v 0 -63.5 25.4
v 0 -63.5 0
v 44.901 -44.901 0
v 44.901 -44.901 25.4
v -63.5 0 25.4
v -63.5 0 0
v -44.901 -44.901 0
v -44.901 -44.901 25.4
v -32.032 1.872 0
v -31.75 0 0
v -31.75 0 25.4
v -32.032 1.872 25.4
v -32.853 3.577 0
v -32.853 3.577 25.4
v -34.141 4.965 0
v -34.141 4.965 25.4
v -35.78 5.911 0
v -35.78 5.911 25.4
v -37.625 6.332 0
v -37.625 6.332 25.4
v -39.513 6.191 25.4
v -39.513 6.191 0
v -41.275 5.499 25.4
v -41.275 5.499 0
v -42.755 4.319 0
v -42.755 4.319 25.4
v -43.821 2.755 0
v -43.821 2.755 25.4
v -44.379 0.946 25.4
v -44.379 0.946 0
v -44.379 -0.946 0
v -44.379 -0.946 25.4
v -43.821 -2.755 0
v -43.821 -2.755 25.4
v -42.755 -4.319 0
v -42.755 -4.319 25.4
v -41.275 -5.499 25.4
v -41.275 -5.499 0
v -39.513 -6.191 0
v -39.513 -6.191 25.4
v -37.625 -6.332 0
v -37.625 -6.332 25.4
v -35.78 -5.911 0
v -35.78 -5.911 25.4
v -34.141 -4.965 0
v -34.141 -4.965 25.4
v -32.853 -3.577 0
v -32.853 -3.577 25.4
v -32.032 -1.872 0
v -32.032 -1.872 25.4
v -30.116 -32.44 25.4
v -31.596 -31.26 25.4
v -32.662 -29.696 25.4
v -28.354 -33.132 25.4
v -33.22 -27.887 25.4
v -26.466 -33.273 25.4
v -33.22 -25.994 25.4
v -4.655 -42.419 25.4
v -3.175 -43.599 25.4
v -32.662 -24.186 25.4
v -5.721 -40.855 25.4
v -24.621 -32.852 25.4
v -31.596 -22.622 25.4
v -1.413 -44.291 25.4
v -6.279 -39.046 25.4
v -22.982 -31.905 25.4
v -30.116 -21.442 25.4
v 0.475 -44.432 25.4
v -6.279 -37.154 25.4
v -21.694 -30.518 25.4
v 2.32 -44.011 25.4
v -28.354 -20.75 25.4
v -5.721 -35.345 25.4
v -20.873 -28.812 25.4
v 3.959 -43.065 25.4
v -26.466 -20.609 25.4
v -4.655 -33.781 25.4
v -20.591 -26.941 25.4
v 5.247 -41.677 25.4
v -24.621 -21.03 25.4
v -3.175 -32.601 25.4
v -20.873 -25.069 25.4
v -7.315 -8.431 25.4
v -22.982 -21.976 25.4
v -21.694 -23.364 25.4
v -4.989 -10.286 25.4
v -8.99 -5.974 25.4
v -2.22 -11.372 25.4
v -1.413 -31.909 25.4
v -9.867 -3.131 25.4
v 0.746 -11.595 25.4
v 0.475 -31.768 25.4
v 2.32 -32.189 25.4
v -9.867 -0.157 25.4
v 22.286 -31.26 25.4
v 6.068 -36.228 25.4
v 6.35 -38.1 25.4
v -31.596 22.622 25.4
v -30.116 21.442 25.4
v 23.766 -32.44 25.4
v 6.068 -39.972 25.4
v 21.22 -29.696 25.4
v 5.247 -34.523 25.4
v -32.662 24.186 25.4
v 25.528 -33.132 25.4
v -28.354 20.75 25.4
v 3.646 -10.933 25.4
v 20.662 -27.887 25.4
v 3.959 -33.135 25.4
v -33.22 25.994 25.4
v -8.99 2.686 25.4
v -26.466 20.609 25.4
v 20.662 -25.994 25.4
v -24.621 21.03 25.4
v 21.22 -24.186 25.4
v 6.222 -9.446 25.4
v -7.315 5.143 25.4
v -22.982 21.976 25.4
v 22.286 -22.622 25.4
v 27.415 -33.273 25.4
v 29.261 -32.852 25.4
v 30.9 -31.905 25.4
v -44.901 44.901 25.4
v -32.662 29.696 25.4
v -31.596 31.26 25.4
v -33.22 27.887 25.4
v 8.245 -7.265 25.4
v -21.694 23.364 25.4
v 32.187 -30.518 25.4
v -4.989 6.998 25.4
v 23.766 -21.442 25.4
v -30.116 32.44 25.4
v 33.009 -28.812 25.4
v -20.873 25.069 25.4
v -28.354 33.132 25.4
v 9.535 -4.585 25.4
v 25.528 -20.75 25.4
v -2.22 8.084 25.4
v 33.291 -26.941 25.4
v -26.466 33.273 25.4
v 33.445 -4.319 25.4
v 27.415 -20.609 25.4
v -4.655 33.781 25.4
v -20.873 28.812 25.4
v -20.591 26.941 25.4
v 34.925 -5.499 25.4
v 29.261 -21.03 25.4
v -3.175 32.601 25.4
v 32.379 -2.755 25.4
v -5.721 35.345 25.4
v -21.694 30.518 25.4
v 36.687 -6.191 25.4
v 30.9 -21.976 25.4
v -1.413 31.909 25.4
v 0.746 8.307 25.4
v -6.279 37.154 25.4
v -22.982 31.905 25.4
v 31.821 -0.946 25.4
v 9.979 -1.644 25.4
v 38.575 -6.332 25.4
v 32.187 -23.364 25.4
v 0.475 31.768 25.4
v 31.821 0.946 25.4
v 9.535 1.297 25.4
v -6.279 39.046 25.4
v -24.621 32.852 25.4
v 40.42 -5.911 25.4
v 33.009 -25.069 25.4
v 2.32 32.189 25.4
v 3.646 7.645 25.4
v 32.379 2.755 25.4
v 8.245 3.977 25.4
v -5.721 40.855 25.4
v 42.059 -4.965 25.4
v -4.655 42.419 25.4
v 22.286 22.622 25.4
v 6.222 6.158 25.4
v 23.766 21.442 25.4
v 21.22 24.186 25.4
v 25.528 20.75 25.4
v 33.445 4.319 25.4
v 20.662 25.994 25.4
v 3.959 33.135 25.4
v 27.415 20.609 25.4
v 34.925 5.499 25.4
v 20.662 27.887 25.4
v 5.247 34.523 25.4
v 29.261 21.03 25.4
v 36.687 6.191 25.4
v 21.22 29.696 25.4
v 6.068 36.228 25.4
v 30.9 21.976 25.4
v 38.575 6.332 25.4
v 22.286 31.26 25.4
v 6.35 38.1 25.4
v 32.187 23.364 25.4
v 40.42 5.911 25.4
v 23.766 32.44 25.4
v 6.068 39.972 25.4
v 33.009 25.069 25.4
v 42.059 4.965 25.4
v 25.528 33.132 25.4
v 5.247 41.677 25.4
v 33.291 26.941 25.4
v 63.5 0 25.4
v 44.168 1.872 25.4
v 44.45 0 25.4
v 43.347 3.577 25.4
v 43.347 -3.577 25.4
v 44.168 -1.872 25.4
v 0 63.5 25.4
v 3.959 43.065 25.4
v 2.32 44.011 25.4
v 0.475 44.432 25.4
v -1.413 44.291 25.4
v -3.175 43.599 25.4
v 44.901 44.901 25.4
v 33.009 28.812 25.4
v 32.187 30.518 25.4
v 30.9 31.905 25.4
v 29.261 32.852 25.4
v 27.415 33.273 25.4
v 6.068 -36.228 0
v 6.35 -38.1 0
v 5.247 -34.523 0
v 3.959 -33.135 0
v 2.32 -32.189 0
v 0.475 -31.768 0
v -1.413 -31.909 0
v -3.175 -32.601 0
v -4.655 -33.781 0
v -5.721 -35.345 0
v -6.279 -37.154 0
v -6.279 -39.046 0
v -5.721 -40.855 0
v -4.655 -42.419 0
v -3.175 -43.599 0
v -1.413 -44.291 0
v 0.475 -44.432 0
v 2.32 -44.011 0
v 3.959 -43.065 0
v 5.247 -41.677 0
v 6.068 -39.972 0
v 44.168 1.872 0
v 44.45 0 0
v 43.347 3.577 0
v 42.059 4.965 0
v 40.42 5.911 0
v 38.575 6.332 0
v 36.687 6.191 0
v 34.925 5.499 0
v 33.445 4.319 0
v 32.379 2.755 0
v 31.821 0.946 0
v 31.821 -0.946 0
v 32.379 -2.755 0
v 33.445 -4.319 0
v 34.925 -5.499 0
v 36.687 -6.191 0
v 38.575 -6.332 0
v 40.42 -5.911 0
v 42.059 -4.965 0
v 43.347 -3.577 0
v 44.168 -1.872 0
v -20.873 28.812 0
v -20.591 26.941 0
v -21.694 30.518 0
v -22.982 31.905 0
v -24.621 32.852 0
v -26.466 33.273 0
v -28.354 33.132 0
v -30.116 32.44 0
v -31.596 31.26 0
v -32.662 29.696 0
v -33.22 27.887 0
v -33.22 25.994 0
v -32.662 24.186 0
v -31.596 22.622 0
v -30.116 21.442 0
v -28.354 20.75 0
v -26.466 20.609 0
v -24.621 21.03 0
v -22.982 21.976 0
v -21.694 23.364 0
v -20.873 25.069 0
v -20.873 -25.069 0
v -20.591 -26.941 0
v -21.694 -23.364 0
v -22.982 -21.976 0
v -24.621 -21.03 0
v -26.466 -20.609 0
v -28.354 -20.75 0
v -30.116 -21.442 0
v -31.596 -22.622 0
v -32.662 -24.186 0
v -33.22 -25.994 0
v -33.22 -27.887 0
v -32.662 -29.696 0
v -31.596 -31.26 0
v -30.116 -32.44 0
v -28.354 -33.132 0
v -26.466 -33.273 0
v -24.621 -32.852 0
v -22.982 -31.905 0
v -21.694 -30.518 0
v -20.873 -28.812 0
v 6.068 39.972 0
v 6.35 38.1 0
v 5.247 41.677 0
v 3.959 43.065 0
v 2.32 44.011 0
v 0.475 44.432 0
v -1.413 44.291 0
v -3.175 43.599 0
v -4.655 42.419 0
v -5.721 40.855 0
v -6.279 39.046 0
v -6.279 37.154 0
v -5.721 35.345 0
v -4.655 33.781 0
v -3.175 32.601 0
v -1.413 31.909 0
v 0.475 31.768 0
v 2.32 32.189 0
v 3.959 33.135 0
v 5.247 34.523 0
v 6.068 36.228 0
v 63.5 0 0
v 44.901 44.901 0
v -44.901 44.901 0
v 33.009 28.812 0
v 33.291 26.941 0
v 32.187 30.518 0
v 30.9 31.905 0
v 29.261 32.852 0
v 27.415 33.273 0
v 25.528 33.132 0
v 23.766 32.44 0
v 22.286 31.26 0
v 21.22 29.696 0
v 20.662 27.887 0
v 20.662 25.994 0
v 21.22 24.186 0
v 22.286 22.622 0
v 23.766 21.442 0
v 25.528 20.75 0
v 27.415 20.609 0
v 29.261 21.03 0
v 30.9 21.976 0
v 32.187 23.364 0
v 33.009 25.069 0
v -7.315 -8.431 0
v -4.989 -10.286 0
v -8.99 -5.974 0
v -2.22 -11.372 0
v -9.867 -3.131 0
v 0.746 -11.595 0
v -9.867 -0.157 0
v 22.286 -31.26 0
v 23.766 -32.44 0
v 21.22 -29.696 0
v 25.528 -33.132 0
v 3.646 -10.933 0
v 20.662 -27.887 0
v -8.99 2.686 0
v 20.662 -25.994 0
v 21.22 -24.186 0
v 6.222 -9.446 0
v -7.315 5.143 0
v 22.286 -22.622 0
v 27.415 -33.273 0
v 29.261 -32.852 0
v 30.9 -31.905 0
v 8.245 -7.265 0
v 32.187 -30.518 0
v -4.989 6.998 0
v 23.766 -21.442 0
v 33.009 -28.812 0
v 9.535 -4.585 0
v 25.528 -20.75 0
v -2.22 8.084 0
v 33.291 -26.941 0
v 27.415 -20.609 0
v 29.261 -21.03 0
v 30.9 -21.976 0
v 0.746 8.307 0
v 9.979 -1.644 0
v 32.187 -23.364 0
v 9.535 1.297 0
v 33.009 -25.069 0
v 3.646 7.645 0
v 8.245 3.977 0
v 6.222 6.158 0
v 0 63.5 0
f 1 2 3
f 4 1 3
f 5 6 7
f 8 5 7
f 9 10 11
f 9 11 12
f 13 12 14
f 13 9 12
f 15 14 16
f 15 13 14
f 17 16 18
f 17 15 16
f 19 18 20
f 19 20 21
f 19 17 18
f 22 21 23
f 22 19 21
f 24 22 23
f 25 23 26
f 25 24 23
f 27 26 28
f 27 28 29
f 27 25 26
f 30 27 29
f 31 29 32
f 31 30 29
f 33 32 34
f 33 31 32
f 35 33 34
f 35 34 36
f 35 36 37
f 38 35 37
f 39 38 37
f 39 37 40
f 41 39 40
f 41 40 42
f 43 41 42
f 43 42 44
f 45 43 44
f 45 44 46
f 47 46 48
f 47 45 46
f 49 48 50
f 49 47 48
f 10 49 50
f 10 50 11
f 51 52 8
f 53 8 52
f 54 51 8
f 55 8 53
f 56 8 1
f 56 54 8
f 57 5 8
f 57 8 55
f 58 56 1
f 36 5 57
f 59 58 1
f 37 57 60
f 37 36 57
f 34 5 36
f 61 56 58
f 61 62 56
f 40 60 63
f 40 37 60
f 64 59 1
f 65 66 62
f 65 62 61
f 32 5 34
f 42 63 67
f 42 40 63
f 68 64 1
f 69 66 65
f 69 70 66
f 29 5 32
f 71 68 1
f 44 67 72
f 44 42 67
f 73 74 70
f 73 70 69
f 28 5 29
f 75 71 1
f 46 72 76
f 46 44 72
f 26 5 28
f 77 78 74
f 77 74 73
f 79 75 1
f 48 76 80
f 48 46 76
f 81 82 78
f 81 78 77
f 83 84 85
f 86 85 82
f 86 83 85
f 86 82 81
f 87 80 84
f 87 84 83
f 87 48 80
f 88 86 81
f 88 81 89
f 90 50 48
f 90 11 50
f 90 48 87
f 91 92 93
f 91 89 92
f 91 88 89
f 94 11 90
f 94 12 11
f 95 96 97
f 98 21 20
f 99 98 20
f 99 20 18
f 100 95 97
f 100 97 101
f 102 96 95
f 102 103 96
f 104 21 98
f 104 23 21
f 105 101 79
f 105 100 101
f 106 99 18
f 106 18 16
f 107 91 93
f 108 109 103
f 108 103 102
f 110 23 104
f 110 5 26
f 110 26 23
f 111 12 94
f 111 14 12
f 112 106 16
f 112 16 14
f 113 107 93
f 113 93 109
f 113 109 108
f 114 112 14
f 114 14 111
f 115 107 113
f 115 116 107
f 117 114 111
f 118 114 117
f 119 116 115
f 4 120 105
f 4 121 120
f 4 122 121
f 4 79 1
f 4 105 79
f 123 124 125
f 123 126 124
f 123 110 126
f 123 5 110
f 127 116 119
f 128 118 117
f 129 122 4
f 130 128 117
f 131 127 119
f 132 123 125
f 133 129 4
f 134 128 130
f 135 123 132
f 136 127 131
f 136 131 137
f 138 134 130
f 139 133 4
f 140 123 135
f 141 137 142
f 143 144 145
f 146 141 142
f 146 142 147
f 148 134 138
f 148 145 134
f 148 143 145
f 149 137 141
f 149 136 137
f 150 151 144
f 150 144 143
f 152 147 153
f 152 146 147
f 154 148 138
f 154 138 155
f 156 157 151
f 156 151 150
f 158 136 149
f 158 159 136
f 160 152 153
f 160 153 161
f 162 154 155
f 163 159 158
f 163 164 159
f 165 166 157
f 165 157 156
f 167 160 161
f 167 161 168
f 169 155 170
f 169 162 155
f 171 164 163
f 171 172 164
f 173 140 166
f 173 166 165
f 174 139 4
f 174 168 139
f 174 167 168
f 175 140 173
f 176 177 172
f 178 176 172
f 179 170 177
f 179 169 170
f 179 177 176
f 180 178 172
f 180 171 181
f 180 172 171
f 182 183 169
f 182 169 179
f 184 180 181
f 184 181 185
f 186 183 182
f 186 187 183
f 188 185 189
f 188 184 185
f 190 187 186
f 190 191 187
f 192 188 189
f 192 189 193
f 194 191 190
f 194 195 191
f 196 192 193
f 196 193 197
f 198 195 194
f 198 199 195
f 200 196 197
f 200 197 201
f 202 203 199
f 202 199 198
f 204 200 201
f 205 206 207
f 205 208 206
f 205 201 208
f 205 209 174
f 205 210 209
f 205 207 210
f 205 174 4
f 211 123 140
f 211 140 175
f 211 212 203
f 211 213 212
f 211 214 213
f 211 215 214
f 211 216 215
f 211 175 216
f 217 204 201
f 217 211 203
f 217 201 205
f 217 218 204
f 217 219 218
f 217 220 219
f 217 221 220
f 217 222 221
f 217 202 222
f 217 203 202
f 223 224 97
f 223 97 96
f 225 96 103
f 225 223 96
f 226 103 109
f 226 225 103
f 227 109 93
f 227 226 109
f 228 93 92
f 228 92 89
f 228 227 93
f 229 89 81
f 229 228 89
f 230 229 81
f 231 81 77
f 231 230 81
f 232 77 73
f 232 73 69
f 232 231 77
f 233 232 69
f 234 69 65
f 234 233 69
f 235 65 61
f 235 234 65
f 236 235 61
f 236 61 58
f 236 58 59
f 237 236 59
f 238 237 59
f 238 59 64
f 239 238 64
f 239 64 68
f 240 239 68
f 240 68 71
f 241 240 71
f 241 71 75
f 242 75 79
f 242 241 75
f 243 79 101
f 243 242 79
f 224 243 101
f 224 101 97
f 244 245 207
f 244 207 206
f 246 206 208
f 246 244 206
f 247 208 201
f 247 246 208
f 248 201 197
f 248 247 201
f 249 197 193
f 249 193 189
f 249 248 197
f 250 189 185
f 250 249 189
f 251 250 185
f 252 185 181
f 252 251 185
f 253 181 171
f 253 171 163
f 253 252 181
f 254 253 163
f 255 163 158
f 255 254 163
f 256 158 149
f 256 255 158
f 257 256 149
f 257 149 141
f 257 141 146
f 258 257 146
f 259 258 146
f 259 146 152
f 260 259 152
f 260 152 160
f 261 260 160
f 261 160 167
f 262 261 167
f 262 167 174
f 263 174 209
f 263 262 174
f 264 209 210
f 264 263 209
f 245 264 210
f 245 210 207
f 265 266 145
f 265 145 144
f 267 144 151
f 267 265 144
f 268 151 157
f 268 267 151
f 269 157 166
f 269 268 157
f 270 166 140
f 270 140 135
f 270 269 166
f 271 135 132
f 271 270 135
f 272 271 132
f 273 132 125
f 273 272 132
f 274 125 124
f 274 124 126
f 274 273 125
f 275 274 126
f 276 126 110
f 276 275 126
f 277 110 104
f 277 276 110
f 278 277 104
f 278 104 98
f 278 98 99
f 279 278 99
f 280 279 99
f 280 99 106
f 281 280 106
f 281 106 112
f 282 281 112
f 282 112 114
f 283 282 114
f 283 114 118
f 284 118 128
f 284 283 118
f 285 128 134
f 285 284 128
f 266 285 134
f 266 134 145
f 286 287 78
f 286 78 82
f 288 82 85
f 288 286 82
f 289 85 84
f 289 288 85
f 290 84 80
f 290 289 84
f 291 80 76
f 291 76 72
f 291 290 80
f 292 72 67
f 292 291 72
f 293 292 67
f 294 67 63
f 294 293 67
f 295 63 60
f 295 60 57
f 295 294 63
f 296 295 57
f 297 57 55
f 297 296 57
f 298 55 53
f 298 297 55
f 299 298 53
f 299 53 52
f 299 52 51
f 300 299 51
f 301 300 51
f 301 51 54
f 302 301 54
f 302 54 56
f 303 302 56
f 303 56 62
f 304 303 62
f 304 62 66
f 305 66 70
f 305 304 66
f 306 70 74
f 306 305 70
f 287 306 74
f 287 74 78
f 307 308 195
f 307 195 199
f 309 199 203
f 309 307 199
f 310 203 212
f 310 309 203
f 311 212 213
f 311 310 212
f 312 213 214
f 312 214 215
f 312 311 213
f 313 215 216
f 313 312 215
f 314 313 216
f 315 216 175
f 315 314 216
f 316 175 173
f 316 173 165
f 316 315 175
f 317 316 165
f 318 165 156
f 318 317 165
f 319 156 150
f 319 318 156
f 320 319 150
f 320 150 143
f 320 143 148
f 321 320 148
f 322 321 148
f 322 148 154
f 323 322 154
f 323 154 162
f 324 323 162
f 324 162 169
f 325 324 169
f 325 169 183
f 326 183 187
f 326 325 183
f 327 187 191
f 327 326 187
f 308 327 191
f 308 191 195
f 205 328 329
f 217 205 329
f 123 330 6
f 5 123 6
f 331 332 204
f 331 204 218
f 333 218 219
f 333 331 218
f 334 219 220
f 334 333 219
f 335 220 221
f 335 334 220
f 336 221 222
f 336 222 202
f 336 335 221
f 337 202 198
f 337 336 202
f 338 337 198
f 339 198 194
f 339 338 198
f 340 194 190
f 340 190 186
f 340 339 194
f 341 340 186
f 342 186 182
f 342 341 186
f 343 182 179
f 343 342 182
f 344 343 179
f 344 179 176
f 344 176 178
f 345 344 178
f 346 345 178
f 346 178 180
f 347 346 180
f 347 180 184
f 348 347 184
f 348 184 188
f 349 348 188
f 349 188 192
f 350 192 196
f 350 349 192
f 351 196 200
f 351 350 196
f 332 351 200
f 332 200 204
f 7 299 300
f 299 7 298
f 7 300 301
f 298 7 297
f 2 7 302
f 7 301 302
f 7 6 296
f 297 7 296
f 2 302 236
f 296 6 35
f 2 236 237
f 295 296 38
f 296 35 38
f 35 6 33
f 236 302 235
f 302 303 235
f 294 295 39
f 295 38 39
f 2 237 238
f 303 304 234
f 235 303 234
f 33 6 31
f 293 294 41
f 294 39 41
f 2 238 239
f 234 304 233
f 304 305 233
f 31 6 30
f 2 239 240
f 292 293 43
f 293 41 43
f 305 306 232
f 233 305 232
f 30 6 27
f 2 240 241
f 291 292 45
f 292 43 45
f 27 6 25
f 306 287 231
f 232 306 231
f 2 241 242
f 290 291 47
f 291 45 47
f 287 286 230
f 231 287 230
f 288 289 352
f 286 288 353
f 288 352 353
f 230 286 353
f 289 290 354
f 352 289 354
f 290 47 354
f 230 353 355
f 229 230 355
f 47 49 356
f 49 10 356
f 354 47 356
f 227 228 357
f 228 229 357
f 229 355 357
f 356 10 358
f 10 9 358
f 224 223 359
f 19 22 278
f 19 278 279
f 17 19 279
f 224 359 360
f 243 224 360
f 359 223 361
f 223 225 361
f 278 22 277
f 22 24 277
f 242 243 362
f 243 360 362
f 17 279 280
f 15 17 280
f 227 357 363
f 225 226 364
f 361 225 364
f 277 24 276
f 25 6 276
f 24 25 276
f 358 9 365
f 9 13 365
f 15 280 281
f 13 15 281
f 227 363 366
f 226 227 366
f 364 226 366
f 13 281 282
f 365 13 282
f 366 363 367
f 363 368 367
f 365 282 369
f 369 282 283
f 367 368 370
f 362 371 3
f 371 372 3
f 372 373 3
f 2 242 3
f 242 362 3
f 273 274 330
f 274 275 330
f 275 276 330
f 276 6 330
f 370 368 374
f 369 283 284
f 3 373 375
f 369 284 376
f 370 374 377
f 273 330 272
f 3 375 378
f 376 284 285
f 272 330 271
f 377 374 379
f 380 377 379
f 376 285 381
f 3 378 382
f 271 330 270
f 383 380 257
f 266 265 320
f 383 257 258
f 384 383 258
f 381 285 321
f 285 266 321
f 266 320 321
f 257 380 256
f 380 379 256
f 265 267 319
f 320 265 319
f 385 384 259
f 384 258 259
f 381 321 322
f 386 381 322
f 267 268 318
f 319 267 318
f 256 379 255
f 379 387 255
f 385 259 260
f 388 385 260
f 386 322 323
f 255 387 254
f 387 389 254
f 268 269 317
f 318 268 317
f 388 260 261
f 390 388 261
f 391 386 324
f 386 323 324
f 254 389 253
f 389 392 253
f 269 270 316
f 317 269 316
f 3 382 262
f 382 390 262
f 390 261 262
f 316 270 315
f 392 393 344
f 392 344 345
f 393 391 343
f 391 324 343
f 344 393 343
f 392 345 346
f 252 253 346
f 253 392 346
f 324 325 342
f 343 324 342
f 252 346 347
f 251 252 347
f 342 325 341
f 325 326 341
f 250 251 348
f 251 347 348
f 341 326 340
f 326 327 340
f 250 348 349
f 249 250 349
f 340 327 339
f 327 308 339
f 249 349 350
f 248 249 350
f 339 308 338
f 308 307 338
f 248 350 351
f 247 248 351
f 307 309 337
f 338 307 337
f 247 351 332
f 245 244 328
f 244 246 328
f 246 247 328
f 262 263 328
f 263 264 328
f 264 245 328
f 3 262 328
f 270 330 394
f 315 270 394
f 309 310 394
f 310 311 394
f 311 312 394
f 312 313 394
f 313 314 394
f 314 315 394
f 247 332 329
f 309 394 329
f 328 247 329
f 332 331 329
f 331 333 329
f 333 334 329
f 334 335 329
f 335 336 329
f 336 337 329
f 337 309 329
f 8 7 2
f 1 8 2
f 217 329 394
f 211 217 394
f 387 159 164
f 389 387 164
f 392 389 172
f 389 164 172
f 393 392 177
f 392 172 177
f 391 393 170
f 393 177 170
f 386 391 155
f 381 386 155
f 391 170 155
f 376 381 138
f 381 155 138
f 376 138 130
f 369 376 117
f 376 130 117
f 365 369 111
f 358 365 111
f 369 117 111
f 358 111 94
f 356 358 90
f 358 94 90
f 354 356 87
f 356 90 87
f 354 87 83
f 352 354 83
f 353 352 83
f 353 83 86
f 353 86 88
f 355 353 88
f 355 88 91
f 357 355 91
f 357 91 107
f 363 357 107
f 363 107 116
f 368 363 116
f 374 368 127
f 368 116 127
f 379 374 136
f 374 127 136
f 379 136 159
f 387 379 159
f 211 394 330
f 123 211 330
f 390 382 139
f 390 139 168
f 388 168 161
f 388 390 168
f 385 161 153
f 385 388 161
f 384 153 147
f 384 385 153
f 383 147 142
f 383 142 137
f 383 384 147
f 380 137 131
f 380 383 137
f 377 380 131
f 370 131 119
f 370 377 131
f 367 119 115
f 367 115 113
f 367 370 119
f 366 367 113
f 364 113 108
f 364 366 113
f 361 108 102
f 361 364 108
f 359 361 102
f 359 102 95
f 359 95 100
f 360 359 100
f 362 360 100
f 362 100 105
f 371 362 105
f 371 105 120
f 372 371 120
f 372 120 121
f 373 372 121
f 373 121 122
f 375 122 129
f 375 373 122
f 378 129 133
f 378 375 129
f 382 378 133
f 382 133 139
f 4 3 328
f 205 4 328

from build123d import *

# Parameters (mm, degrees)
F0_R     = 6.35
F1_DEPTH = 25.4
F2_R     = 9.978597
F3_DEPTH = 25.4


with BuildPart() as f1:
    # F0 (on Top) → F1 (new body)
    with BuildSketch(Plane.XY):
        Polygon((44.901281, -44.901281), (63.5, 0), (44.901281, 44.901281), (0, 63.5), (-44.901281, 44.901281), (-63.5, 0), (-44.901281, -44.901281), (0, -63.5), align=None)
        with Locations((-26.940768, -26.940768)):
            Circle(F0_R, mode=Mode.SUBTRACT)
        with Locations((0, -38.1)):
            Circle(F0_R, mode=Mode.SUBTRACT)
        with Locations((26.940768, -26.940768)):
            Circle(F0_R, mode=Mode.SUBTRACT)
        with Locations((-38.1, 0)):
            Circle(F0_R, mode=Mode.SUBTRACT)
        with Locations((-26.940768, 26.940768)):
            Circle(F0_R, mode=Mode.SUBTRACT)
        with Locations((26.940768, 26.940768)):
            Circle(F0_R, mode=Mode.SUBTRACT)
        with Locations((38.1, 0)):
            Circle(F0_R, mode=Mode.SUBTRACT)
        with Locations((0, 38.1)):
            Circle(F0_R, mode=Mode.SUBTRACT)
    extrude(amount=F1_DEPTH)

    # F2 (on face) → F3 (cut)
    with BuildSketch(Plane.XY.offset(25.4)):
        with Locations((0, -1.644041)):
            Circle(F2_R)
    extrude(amount=-F3_DEPTH, mode=Mode.SUBTRACT)


solid = f1.part
